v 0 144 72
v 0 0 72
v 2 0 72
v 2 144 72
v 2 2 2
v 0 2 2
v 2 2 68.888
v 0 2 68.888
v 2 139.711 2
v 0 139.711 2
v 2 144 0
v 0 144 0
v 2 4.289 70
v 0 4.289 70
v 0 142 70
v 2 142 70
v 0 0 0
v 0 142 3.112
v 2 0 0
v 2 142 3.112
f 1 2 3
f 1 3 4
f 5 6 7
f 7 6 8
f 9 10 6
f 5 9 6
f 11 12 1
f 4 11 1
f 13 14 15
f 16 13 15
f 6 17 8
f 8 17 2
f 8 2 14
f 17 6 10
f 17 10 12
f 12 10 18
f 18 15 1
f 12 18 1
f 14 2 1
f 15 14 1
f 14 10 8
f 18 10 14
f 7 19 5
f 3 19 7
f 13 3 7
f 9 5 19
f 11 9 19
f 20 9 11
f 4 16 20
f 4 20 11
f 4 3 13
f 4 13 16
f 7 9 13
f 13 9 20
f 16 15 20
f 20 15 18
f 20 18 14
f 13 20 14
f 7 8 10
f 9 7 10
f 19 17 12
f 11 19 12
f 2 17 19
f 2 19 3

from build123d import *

# Parameters (mm, degrees)
F0_W     = 144
F0_H     = 72
F1_DEPTH = 2


with BuildPart() as f1:
    # F0 (on Right) → F1 (new body)
    with BuildSketch(Plane.YZ):
        with Locations((72, 36)):
            Rectangle(F0_W, F0_H)
        Polygon((139.711167, 2), (2, 2), (2, 68.888281), align=None, mode=Mode.SUBTRACT)
        Polygon((4.288833, 70), (142, 70), (142, 3.111719), align=None, mode=Mode.SUBTRACT)
    extrude(amount=F1_DEPTH)


solid = f1.part
